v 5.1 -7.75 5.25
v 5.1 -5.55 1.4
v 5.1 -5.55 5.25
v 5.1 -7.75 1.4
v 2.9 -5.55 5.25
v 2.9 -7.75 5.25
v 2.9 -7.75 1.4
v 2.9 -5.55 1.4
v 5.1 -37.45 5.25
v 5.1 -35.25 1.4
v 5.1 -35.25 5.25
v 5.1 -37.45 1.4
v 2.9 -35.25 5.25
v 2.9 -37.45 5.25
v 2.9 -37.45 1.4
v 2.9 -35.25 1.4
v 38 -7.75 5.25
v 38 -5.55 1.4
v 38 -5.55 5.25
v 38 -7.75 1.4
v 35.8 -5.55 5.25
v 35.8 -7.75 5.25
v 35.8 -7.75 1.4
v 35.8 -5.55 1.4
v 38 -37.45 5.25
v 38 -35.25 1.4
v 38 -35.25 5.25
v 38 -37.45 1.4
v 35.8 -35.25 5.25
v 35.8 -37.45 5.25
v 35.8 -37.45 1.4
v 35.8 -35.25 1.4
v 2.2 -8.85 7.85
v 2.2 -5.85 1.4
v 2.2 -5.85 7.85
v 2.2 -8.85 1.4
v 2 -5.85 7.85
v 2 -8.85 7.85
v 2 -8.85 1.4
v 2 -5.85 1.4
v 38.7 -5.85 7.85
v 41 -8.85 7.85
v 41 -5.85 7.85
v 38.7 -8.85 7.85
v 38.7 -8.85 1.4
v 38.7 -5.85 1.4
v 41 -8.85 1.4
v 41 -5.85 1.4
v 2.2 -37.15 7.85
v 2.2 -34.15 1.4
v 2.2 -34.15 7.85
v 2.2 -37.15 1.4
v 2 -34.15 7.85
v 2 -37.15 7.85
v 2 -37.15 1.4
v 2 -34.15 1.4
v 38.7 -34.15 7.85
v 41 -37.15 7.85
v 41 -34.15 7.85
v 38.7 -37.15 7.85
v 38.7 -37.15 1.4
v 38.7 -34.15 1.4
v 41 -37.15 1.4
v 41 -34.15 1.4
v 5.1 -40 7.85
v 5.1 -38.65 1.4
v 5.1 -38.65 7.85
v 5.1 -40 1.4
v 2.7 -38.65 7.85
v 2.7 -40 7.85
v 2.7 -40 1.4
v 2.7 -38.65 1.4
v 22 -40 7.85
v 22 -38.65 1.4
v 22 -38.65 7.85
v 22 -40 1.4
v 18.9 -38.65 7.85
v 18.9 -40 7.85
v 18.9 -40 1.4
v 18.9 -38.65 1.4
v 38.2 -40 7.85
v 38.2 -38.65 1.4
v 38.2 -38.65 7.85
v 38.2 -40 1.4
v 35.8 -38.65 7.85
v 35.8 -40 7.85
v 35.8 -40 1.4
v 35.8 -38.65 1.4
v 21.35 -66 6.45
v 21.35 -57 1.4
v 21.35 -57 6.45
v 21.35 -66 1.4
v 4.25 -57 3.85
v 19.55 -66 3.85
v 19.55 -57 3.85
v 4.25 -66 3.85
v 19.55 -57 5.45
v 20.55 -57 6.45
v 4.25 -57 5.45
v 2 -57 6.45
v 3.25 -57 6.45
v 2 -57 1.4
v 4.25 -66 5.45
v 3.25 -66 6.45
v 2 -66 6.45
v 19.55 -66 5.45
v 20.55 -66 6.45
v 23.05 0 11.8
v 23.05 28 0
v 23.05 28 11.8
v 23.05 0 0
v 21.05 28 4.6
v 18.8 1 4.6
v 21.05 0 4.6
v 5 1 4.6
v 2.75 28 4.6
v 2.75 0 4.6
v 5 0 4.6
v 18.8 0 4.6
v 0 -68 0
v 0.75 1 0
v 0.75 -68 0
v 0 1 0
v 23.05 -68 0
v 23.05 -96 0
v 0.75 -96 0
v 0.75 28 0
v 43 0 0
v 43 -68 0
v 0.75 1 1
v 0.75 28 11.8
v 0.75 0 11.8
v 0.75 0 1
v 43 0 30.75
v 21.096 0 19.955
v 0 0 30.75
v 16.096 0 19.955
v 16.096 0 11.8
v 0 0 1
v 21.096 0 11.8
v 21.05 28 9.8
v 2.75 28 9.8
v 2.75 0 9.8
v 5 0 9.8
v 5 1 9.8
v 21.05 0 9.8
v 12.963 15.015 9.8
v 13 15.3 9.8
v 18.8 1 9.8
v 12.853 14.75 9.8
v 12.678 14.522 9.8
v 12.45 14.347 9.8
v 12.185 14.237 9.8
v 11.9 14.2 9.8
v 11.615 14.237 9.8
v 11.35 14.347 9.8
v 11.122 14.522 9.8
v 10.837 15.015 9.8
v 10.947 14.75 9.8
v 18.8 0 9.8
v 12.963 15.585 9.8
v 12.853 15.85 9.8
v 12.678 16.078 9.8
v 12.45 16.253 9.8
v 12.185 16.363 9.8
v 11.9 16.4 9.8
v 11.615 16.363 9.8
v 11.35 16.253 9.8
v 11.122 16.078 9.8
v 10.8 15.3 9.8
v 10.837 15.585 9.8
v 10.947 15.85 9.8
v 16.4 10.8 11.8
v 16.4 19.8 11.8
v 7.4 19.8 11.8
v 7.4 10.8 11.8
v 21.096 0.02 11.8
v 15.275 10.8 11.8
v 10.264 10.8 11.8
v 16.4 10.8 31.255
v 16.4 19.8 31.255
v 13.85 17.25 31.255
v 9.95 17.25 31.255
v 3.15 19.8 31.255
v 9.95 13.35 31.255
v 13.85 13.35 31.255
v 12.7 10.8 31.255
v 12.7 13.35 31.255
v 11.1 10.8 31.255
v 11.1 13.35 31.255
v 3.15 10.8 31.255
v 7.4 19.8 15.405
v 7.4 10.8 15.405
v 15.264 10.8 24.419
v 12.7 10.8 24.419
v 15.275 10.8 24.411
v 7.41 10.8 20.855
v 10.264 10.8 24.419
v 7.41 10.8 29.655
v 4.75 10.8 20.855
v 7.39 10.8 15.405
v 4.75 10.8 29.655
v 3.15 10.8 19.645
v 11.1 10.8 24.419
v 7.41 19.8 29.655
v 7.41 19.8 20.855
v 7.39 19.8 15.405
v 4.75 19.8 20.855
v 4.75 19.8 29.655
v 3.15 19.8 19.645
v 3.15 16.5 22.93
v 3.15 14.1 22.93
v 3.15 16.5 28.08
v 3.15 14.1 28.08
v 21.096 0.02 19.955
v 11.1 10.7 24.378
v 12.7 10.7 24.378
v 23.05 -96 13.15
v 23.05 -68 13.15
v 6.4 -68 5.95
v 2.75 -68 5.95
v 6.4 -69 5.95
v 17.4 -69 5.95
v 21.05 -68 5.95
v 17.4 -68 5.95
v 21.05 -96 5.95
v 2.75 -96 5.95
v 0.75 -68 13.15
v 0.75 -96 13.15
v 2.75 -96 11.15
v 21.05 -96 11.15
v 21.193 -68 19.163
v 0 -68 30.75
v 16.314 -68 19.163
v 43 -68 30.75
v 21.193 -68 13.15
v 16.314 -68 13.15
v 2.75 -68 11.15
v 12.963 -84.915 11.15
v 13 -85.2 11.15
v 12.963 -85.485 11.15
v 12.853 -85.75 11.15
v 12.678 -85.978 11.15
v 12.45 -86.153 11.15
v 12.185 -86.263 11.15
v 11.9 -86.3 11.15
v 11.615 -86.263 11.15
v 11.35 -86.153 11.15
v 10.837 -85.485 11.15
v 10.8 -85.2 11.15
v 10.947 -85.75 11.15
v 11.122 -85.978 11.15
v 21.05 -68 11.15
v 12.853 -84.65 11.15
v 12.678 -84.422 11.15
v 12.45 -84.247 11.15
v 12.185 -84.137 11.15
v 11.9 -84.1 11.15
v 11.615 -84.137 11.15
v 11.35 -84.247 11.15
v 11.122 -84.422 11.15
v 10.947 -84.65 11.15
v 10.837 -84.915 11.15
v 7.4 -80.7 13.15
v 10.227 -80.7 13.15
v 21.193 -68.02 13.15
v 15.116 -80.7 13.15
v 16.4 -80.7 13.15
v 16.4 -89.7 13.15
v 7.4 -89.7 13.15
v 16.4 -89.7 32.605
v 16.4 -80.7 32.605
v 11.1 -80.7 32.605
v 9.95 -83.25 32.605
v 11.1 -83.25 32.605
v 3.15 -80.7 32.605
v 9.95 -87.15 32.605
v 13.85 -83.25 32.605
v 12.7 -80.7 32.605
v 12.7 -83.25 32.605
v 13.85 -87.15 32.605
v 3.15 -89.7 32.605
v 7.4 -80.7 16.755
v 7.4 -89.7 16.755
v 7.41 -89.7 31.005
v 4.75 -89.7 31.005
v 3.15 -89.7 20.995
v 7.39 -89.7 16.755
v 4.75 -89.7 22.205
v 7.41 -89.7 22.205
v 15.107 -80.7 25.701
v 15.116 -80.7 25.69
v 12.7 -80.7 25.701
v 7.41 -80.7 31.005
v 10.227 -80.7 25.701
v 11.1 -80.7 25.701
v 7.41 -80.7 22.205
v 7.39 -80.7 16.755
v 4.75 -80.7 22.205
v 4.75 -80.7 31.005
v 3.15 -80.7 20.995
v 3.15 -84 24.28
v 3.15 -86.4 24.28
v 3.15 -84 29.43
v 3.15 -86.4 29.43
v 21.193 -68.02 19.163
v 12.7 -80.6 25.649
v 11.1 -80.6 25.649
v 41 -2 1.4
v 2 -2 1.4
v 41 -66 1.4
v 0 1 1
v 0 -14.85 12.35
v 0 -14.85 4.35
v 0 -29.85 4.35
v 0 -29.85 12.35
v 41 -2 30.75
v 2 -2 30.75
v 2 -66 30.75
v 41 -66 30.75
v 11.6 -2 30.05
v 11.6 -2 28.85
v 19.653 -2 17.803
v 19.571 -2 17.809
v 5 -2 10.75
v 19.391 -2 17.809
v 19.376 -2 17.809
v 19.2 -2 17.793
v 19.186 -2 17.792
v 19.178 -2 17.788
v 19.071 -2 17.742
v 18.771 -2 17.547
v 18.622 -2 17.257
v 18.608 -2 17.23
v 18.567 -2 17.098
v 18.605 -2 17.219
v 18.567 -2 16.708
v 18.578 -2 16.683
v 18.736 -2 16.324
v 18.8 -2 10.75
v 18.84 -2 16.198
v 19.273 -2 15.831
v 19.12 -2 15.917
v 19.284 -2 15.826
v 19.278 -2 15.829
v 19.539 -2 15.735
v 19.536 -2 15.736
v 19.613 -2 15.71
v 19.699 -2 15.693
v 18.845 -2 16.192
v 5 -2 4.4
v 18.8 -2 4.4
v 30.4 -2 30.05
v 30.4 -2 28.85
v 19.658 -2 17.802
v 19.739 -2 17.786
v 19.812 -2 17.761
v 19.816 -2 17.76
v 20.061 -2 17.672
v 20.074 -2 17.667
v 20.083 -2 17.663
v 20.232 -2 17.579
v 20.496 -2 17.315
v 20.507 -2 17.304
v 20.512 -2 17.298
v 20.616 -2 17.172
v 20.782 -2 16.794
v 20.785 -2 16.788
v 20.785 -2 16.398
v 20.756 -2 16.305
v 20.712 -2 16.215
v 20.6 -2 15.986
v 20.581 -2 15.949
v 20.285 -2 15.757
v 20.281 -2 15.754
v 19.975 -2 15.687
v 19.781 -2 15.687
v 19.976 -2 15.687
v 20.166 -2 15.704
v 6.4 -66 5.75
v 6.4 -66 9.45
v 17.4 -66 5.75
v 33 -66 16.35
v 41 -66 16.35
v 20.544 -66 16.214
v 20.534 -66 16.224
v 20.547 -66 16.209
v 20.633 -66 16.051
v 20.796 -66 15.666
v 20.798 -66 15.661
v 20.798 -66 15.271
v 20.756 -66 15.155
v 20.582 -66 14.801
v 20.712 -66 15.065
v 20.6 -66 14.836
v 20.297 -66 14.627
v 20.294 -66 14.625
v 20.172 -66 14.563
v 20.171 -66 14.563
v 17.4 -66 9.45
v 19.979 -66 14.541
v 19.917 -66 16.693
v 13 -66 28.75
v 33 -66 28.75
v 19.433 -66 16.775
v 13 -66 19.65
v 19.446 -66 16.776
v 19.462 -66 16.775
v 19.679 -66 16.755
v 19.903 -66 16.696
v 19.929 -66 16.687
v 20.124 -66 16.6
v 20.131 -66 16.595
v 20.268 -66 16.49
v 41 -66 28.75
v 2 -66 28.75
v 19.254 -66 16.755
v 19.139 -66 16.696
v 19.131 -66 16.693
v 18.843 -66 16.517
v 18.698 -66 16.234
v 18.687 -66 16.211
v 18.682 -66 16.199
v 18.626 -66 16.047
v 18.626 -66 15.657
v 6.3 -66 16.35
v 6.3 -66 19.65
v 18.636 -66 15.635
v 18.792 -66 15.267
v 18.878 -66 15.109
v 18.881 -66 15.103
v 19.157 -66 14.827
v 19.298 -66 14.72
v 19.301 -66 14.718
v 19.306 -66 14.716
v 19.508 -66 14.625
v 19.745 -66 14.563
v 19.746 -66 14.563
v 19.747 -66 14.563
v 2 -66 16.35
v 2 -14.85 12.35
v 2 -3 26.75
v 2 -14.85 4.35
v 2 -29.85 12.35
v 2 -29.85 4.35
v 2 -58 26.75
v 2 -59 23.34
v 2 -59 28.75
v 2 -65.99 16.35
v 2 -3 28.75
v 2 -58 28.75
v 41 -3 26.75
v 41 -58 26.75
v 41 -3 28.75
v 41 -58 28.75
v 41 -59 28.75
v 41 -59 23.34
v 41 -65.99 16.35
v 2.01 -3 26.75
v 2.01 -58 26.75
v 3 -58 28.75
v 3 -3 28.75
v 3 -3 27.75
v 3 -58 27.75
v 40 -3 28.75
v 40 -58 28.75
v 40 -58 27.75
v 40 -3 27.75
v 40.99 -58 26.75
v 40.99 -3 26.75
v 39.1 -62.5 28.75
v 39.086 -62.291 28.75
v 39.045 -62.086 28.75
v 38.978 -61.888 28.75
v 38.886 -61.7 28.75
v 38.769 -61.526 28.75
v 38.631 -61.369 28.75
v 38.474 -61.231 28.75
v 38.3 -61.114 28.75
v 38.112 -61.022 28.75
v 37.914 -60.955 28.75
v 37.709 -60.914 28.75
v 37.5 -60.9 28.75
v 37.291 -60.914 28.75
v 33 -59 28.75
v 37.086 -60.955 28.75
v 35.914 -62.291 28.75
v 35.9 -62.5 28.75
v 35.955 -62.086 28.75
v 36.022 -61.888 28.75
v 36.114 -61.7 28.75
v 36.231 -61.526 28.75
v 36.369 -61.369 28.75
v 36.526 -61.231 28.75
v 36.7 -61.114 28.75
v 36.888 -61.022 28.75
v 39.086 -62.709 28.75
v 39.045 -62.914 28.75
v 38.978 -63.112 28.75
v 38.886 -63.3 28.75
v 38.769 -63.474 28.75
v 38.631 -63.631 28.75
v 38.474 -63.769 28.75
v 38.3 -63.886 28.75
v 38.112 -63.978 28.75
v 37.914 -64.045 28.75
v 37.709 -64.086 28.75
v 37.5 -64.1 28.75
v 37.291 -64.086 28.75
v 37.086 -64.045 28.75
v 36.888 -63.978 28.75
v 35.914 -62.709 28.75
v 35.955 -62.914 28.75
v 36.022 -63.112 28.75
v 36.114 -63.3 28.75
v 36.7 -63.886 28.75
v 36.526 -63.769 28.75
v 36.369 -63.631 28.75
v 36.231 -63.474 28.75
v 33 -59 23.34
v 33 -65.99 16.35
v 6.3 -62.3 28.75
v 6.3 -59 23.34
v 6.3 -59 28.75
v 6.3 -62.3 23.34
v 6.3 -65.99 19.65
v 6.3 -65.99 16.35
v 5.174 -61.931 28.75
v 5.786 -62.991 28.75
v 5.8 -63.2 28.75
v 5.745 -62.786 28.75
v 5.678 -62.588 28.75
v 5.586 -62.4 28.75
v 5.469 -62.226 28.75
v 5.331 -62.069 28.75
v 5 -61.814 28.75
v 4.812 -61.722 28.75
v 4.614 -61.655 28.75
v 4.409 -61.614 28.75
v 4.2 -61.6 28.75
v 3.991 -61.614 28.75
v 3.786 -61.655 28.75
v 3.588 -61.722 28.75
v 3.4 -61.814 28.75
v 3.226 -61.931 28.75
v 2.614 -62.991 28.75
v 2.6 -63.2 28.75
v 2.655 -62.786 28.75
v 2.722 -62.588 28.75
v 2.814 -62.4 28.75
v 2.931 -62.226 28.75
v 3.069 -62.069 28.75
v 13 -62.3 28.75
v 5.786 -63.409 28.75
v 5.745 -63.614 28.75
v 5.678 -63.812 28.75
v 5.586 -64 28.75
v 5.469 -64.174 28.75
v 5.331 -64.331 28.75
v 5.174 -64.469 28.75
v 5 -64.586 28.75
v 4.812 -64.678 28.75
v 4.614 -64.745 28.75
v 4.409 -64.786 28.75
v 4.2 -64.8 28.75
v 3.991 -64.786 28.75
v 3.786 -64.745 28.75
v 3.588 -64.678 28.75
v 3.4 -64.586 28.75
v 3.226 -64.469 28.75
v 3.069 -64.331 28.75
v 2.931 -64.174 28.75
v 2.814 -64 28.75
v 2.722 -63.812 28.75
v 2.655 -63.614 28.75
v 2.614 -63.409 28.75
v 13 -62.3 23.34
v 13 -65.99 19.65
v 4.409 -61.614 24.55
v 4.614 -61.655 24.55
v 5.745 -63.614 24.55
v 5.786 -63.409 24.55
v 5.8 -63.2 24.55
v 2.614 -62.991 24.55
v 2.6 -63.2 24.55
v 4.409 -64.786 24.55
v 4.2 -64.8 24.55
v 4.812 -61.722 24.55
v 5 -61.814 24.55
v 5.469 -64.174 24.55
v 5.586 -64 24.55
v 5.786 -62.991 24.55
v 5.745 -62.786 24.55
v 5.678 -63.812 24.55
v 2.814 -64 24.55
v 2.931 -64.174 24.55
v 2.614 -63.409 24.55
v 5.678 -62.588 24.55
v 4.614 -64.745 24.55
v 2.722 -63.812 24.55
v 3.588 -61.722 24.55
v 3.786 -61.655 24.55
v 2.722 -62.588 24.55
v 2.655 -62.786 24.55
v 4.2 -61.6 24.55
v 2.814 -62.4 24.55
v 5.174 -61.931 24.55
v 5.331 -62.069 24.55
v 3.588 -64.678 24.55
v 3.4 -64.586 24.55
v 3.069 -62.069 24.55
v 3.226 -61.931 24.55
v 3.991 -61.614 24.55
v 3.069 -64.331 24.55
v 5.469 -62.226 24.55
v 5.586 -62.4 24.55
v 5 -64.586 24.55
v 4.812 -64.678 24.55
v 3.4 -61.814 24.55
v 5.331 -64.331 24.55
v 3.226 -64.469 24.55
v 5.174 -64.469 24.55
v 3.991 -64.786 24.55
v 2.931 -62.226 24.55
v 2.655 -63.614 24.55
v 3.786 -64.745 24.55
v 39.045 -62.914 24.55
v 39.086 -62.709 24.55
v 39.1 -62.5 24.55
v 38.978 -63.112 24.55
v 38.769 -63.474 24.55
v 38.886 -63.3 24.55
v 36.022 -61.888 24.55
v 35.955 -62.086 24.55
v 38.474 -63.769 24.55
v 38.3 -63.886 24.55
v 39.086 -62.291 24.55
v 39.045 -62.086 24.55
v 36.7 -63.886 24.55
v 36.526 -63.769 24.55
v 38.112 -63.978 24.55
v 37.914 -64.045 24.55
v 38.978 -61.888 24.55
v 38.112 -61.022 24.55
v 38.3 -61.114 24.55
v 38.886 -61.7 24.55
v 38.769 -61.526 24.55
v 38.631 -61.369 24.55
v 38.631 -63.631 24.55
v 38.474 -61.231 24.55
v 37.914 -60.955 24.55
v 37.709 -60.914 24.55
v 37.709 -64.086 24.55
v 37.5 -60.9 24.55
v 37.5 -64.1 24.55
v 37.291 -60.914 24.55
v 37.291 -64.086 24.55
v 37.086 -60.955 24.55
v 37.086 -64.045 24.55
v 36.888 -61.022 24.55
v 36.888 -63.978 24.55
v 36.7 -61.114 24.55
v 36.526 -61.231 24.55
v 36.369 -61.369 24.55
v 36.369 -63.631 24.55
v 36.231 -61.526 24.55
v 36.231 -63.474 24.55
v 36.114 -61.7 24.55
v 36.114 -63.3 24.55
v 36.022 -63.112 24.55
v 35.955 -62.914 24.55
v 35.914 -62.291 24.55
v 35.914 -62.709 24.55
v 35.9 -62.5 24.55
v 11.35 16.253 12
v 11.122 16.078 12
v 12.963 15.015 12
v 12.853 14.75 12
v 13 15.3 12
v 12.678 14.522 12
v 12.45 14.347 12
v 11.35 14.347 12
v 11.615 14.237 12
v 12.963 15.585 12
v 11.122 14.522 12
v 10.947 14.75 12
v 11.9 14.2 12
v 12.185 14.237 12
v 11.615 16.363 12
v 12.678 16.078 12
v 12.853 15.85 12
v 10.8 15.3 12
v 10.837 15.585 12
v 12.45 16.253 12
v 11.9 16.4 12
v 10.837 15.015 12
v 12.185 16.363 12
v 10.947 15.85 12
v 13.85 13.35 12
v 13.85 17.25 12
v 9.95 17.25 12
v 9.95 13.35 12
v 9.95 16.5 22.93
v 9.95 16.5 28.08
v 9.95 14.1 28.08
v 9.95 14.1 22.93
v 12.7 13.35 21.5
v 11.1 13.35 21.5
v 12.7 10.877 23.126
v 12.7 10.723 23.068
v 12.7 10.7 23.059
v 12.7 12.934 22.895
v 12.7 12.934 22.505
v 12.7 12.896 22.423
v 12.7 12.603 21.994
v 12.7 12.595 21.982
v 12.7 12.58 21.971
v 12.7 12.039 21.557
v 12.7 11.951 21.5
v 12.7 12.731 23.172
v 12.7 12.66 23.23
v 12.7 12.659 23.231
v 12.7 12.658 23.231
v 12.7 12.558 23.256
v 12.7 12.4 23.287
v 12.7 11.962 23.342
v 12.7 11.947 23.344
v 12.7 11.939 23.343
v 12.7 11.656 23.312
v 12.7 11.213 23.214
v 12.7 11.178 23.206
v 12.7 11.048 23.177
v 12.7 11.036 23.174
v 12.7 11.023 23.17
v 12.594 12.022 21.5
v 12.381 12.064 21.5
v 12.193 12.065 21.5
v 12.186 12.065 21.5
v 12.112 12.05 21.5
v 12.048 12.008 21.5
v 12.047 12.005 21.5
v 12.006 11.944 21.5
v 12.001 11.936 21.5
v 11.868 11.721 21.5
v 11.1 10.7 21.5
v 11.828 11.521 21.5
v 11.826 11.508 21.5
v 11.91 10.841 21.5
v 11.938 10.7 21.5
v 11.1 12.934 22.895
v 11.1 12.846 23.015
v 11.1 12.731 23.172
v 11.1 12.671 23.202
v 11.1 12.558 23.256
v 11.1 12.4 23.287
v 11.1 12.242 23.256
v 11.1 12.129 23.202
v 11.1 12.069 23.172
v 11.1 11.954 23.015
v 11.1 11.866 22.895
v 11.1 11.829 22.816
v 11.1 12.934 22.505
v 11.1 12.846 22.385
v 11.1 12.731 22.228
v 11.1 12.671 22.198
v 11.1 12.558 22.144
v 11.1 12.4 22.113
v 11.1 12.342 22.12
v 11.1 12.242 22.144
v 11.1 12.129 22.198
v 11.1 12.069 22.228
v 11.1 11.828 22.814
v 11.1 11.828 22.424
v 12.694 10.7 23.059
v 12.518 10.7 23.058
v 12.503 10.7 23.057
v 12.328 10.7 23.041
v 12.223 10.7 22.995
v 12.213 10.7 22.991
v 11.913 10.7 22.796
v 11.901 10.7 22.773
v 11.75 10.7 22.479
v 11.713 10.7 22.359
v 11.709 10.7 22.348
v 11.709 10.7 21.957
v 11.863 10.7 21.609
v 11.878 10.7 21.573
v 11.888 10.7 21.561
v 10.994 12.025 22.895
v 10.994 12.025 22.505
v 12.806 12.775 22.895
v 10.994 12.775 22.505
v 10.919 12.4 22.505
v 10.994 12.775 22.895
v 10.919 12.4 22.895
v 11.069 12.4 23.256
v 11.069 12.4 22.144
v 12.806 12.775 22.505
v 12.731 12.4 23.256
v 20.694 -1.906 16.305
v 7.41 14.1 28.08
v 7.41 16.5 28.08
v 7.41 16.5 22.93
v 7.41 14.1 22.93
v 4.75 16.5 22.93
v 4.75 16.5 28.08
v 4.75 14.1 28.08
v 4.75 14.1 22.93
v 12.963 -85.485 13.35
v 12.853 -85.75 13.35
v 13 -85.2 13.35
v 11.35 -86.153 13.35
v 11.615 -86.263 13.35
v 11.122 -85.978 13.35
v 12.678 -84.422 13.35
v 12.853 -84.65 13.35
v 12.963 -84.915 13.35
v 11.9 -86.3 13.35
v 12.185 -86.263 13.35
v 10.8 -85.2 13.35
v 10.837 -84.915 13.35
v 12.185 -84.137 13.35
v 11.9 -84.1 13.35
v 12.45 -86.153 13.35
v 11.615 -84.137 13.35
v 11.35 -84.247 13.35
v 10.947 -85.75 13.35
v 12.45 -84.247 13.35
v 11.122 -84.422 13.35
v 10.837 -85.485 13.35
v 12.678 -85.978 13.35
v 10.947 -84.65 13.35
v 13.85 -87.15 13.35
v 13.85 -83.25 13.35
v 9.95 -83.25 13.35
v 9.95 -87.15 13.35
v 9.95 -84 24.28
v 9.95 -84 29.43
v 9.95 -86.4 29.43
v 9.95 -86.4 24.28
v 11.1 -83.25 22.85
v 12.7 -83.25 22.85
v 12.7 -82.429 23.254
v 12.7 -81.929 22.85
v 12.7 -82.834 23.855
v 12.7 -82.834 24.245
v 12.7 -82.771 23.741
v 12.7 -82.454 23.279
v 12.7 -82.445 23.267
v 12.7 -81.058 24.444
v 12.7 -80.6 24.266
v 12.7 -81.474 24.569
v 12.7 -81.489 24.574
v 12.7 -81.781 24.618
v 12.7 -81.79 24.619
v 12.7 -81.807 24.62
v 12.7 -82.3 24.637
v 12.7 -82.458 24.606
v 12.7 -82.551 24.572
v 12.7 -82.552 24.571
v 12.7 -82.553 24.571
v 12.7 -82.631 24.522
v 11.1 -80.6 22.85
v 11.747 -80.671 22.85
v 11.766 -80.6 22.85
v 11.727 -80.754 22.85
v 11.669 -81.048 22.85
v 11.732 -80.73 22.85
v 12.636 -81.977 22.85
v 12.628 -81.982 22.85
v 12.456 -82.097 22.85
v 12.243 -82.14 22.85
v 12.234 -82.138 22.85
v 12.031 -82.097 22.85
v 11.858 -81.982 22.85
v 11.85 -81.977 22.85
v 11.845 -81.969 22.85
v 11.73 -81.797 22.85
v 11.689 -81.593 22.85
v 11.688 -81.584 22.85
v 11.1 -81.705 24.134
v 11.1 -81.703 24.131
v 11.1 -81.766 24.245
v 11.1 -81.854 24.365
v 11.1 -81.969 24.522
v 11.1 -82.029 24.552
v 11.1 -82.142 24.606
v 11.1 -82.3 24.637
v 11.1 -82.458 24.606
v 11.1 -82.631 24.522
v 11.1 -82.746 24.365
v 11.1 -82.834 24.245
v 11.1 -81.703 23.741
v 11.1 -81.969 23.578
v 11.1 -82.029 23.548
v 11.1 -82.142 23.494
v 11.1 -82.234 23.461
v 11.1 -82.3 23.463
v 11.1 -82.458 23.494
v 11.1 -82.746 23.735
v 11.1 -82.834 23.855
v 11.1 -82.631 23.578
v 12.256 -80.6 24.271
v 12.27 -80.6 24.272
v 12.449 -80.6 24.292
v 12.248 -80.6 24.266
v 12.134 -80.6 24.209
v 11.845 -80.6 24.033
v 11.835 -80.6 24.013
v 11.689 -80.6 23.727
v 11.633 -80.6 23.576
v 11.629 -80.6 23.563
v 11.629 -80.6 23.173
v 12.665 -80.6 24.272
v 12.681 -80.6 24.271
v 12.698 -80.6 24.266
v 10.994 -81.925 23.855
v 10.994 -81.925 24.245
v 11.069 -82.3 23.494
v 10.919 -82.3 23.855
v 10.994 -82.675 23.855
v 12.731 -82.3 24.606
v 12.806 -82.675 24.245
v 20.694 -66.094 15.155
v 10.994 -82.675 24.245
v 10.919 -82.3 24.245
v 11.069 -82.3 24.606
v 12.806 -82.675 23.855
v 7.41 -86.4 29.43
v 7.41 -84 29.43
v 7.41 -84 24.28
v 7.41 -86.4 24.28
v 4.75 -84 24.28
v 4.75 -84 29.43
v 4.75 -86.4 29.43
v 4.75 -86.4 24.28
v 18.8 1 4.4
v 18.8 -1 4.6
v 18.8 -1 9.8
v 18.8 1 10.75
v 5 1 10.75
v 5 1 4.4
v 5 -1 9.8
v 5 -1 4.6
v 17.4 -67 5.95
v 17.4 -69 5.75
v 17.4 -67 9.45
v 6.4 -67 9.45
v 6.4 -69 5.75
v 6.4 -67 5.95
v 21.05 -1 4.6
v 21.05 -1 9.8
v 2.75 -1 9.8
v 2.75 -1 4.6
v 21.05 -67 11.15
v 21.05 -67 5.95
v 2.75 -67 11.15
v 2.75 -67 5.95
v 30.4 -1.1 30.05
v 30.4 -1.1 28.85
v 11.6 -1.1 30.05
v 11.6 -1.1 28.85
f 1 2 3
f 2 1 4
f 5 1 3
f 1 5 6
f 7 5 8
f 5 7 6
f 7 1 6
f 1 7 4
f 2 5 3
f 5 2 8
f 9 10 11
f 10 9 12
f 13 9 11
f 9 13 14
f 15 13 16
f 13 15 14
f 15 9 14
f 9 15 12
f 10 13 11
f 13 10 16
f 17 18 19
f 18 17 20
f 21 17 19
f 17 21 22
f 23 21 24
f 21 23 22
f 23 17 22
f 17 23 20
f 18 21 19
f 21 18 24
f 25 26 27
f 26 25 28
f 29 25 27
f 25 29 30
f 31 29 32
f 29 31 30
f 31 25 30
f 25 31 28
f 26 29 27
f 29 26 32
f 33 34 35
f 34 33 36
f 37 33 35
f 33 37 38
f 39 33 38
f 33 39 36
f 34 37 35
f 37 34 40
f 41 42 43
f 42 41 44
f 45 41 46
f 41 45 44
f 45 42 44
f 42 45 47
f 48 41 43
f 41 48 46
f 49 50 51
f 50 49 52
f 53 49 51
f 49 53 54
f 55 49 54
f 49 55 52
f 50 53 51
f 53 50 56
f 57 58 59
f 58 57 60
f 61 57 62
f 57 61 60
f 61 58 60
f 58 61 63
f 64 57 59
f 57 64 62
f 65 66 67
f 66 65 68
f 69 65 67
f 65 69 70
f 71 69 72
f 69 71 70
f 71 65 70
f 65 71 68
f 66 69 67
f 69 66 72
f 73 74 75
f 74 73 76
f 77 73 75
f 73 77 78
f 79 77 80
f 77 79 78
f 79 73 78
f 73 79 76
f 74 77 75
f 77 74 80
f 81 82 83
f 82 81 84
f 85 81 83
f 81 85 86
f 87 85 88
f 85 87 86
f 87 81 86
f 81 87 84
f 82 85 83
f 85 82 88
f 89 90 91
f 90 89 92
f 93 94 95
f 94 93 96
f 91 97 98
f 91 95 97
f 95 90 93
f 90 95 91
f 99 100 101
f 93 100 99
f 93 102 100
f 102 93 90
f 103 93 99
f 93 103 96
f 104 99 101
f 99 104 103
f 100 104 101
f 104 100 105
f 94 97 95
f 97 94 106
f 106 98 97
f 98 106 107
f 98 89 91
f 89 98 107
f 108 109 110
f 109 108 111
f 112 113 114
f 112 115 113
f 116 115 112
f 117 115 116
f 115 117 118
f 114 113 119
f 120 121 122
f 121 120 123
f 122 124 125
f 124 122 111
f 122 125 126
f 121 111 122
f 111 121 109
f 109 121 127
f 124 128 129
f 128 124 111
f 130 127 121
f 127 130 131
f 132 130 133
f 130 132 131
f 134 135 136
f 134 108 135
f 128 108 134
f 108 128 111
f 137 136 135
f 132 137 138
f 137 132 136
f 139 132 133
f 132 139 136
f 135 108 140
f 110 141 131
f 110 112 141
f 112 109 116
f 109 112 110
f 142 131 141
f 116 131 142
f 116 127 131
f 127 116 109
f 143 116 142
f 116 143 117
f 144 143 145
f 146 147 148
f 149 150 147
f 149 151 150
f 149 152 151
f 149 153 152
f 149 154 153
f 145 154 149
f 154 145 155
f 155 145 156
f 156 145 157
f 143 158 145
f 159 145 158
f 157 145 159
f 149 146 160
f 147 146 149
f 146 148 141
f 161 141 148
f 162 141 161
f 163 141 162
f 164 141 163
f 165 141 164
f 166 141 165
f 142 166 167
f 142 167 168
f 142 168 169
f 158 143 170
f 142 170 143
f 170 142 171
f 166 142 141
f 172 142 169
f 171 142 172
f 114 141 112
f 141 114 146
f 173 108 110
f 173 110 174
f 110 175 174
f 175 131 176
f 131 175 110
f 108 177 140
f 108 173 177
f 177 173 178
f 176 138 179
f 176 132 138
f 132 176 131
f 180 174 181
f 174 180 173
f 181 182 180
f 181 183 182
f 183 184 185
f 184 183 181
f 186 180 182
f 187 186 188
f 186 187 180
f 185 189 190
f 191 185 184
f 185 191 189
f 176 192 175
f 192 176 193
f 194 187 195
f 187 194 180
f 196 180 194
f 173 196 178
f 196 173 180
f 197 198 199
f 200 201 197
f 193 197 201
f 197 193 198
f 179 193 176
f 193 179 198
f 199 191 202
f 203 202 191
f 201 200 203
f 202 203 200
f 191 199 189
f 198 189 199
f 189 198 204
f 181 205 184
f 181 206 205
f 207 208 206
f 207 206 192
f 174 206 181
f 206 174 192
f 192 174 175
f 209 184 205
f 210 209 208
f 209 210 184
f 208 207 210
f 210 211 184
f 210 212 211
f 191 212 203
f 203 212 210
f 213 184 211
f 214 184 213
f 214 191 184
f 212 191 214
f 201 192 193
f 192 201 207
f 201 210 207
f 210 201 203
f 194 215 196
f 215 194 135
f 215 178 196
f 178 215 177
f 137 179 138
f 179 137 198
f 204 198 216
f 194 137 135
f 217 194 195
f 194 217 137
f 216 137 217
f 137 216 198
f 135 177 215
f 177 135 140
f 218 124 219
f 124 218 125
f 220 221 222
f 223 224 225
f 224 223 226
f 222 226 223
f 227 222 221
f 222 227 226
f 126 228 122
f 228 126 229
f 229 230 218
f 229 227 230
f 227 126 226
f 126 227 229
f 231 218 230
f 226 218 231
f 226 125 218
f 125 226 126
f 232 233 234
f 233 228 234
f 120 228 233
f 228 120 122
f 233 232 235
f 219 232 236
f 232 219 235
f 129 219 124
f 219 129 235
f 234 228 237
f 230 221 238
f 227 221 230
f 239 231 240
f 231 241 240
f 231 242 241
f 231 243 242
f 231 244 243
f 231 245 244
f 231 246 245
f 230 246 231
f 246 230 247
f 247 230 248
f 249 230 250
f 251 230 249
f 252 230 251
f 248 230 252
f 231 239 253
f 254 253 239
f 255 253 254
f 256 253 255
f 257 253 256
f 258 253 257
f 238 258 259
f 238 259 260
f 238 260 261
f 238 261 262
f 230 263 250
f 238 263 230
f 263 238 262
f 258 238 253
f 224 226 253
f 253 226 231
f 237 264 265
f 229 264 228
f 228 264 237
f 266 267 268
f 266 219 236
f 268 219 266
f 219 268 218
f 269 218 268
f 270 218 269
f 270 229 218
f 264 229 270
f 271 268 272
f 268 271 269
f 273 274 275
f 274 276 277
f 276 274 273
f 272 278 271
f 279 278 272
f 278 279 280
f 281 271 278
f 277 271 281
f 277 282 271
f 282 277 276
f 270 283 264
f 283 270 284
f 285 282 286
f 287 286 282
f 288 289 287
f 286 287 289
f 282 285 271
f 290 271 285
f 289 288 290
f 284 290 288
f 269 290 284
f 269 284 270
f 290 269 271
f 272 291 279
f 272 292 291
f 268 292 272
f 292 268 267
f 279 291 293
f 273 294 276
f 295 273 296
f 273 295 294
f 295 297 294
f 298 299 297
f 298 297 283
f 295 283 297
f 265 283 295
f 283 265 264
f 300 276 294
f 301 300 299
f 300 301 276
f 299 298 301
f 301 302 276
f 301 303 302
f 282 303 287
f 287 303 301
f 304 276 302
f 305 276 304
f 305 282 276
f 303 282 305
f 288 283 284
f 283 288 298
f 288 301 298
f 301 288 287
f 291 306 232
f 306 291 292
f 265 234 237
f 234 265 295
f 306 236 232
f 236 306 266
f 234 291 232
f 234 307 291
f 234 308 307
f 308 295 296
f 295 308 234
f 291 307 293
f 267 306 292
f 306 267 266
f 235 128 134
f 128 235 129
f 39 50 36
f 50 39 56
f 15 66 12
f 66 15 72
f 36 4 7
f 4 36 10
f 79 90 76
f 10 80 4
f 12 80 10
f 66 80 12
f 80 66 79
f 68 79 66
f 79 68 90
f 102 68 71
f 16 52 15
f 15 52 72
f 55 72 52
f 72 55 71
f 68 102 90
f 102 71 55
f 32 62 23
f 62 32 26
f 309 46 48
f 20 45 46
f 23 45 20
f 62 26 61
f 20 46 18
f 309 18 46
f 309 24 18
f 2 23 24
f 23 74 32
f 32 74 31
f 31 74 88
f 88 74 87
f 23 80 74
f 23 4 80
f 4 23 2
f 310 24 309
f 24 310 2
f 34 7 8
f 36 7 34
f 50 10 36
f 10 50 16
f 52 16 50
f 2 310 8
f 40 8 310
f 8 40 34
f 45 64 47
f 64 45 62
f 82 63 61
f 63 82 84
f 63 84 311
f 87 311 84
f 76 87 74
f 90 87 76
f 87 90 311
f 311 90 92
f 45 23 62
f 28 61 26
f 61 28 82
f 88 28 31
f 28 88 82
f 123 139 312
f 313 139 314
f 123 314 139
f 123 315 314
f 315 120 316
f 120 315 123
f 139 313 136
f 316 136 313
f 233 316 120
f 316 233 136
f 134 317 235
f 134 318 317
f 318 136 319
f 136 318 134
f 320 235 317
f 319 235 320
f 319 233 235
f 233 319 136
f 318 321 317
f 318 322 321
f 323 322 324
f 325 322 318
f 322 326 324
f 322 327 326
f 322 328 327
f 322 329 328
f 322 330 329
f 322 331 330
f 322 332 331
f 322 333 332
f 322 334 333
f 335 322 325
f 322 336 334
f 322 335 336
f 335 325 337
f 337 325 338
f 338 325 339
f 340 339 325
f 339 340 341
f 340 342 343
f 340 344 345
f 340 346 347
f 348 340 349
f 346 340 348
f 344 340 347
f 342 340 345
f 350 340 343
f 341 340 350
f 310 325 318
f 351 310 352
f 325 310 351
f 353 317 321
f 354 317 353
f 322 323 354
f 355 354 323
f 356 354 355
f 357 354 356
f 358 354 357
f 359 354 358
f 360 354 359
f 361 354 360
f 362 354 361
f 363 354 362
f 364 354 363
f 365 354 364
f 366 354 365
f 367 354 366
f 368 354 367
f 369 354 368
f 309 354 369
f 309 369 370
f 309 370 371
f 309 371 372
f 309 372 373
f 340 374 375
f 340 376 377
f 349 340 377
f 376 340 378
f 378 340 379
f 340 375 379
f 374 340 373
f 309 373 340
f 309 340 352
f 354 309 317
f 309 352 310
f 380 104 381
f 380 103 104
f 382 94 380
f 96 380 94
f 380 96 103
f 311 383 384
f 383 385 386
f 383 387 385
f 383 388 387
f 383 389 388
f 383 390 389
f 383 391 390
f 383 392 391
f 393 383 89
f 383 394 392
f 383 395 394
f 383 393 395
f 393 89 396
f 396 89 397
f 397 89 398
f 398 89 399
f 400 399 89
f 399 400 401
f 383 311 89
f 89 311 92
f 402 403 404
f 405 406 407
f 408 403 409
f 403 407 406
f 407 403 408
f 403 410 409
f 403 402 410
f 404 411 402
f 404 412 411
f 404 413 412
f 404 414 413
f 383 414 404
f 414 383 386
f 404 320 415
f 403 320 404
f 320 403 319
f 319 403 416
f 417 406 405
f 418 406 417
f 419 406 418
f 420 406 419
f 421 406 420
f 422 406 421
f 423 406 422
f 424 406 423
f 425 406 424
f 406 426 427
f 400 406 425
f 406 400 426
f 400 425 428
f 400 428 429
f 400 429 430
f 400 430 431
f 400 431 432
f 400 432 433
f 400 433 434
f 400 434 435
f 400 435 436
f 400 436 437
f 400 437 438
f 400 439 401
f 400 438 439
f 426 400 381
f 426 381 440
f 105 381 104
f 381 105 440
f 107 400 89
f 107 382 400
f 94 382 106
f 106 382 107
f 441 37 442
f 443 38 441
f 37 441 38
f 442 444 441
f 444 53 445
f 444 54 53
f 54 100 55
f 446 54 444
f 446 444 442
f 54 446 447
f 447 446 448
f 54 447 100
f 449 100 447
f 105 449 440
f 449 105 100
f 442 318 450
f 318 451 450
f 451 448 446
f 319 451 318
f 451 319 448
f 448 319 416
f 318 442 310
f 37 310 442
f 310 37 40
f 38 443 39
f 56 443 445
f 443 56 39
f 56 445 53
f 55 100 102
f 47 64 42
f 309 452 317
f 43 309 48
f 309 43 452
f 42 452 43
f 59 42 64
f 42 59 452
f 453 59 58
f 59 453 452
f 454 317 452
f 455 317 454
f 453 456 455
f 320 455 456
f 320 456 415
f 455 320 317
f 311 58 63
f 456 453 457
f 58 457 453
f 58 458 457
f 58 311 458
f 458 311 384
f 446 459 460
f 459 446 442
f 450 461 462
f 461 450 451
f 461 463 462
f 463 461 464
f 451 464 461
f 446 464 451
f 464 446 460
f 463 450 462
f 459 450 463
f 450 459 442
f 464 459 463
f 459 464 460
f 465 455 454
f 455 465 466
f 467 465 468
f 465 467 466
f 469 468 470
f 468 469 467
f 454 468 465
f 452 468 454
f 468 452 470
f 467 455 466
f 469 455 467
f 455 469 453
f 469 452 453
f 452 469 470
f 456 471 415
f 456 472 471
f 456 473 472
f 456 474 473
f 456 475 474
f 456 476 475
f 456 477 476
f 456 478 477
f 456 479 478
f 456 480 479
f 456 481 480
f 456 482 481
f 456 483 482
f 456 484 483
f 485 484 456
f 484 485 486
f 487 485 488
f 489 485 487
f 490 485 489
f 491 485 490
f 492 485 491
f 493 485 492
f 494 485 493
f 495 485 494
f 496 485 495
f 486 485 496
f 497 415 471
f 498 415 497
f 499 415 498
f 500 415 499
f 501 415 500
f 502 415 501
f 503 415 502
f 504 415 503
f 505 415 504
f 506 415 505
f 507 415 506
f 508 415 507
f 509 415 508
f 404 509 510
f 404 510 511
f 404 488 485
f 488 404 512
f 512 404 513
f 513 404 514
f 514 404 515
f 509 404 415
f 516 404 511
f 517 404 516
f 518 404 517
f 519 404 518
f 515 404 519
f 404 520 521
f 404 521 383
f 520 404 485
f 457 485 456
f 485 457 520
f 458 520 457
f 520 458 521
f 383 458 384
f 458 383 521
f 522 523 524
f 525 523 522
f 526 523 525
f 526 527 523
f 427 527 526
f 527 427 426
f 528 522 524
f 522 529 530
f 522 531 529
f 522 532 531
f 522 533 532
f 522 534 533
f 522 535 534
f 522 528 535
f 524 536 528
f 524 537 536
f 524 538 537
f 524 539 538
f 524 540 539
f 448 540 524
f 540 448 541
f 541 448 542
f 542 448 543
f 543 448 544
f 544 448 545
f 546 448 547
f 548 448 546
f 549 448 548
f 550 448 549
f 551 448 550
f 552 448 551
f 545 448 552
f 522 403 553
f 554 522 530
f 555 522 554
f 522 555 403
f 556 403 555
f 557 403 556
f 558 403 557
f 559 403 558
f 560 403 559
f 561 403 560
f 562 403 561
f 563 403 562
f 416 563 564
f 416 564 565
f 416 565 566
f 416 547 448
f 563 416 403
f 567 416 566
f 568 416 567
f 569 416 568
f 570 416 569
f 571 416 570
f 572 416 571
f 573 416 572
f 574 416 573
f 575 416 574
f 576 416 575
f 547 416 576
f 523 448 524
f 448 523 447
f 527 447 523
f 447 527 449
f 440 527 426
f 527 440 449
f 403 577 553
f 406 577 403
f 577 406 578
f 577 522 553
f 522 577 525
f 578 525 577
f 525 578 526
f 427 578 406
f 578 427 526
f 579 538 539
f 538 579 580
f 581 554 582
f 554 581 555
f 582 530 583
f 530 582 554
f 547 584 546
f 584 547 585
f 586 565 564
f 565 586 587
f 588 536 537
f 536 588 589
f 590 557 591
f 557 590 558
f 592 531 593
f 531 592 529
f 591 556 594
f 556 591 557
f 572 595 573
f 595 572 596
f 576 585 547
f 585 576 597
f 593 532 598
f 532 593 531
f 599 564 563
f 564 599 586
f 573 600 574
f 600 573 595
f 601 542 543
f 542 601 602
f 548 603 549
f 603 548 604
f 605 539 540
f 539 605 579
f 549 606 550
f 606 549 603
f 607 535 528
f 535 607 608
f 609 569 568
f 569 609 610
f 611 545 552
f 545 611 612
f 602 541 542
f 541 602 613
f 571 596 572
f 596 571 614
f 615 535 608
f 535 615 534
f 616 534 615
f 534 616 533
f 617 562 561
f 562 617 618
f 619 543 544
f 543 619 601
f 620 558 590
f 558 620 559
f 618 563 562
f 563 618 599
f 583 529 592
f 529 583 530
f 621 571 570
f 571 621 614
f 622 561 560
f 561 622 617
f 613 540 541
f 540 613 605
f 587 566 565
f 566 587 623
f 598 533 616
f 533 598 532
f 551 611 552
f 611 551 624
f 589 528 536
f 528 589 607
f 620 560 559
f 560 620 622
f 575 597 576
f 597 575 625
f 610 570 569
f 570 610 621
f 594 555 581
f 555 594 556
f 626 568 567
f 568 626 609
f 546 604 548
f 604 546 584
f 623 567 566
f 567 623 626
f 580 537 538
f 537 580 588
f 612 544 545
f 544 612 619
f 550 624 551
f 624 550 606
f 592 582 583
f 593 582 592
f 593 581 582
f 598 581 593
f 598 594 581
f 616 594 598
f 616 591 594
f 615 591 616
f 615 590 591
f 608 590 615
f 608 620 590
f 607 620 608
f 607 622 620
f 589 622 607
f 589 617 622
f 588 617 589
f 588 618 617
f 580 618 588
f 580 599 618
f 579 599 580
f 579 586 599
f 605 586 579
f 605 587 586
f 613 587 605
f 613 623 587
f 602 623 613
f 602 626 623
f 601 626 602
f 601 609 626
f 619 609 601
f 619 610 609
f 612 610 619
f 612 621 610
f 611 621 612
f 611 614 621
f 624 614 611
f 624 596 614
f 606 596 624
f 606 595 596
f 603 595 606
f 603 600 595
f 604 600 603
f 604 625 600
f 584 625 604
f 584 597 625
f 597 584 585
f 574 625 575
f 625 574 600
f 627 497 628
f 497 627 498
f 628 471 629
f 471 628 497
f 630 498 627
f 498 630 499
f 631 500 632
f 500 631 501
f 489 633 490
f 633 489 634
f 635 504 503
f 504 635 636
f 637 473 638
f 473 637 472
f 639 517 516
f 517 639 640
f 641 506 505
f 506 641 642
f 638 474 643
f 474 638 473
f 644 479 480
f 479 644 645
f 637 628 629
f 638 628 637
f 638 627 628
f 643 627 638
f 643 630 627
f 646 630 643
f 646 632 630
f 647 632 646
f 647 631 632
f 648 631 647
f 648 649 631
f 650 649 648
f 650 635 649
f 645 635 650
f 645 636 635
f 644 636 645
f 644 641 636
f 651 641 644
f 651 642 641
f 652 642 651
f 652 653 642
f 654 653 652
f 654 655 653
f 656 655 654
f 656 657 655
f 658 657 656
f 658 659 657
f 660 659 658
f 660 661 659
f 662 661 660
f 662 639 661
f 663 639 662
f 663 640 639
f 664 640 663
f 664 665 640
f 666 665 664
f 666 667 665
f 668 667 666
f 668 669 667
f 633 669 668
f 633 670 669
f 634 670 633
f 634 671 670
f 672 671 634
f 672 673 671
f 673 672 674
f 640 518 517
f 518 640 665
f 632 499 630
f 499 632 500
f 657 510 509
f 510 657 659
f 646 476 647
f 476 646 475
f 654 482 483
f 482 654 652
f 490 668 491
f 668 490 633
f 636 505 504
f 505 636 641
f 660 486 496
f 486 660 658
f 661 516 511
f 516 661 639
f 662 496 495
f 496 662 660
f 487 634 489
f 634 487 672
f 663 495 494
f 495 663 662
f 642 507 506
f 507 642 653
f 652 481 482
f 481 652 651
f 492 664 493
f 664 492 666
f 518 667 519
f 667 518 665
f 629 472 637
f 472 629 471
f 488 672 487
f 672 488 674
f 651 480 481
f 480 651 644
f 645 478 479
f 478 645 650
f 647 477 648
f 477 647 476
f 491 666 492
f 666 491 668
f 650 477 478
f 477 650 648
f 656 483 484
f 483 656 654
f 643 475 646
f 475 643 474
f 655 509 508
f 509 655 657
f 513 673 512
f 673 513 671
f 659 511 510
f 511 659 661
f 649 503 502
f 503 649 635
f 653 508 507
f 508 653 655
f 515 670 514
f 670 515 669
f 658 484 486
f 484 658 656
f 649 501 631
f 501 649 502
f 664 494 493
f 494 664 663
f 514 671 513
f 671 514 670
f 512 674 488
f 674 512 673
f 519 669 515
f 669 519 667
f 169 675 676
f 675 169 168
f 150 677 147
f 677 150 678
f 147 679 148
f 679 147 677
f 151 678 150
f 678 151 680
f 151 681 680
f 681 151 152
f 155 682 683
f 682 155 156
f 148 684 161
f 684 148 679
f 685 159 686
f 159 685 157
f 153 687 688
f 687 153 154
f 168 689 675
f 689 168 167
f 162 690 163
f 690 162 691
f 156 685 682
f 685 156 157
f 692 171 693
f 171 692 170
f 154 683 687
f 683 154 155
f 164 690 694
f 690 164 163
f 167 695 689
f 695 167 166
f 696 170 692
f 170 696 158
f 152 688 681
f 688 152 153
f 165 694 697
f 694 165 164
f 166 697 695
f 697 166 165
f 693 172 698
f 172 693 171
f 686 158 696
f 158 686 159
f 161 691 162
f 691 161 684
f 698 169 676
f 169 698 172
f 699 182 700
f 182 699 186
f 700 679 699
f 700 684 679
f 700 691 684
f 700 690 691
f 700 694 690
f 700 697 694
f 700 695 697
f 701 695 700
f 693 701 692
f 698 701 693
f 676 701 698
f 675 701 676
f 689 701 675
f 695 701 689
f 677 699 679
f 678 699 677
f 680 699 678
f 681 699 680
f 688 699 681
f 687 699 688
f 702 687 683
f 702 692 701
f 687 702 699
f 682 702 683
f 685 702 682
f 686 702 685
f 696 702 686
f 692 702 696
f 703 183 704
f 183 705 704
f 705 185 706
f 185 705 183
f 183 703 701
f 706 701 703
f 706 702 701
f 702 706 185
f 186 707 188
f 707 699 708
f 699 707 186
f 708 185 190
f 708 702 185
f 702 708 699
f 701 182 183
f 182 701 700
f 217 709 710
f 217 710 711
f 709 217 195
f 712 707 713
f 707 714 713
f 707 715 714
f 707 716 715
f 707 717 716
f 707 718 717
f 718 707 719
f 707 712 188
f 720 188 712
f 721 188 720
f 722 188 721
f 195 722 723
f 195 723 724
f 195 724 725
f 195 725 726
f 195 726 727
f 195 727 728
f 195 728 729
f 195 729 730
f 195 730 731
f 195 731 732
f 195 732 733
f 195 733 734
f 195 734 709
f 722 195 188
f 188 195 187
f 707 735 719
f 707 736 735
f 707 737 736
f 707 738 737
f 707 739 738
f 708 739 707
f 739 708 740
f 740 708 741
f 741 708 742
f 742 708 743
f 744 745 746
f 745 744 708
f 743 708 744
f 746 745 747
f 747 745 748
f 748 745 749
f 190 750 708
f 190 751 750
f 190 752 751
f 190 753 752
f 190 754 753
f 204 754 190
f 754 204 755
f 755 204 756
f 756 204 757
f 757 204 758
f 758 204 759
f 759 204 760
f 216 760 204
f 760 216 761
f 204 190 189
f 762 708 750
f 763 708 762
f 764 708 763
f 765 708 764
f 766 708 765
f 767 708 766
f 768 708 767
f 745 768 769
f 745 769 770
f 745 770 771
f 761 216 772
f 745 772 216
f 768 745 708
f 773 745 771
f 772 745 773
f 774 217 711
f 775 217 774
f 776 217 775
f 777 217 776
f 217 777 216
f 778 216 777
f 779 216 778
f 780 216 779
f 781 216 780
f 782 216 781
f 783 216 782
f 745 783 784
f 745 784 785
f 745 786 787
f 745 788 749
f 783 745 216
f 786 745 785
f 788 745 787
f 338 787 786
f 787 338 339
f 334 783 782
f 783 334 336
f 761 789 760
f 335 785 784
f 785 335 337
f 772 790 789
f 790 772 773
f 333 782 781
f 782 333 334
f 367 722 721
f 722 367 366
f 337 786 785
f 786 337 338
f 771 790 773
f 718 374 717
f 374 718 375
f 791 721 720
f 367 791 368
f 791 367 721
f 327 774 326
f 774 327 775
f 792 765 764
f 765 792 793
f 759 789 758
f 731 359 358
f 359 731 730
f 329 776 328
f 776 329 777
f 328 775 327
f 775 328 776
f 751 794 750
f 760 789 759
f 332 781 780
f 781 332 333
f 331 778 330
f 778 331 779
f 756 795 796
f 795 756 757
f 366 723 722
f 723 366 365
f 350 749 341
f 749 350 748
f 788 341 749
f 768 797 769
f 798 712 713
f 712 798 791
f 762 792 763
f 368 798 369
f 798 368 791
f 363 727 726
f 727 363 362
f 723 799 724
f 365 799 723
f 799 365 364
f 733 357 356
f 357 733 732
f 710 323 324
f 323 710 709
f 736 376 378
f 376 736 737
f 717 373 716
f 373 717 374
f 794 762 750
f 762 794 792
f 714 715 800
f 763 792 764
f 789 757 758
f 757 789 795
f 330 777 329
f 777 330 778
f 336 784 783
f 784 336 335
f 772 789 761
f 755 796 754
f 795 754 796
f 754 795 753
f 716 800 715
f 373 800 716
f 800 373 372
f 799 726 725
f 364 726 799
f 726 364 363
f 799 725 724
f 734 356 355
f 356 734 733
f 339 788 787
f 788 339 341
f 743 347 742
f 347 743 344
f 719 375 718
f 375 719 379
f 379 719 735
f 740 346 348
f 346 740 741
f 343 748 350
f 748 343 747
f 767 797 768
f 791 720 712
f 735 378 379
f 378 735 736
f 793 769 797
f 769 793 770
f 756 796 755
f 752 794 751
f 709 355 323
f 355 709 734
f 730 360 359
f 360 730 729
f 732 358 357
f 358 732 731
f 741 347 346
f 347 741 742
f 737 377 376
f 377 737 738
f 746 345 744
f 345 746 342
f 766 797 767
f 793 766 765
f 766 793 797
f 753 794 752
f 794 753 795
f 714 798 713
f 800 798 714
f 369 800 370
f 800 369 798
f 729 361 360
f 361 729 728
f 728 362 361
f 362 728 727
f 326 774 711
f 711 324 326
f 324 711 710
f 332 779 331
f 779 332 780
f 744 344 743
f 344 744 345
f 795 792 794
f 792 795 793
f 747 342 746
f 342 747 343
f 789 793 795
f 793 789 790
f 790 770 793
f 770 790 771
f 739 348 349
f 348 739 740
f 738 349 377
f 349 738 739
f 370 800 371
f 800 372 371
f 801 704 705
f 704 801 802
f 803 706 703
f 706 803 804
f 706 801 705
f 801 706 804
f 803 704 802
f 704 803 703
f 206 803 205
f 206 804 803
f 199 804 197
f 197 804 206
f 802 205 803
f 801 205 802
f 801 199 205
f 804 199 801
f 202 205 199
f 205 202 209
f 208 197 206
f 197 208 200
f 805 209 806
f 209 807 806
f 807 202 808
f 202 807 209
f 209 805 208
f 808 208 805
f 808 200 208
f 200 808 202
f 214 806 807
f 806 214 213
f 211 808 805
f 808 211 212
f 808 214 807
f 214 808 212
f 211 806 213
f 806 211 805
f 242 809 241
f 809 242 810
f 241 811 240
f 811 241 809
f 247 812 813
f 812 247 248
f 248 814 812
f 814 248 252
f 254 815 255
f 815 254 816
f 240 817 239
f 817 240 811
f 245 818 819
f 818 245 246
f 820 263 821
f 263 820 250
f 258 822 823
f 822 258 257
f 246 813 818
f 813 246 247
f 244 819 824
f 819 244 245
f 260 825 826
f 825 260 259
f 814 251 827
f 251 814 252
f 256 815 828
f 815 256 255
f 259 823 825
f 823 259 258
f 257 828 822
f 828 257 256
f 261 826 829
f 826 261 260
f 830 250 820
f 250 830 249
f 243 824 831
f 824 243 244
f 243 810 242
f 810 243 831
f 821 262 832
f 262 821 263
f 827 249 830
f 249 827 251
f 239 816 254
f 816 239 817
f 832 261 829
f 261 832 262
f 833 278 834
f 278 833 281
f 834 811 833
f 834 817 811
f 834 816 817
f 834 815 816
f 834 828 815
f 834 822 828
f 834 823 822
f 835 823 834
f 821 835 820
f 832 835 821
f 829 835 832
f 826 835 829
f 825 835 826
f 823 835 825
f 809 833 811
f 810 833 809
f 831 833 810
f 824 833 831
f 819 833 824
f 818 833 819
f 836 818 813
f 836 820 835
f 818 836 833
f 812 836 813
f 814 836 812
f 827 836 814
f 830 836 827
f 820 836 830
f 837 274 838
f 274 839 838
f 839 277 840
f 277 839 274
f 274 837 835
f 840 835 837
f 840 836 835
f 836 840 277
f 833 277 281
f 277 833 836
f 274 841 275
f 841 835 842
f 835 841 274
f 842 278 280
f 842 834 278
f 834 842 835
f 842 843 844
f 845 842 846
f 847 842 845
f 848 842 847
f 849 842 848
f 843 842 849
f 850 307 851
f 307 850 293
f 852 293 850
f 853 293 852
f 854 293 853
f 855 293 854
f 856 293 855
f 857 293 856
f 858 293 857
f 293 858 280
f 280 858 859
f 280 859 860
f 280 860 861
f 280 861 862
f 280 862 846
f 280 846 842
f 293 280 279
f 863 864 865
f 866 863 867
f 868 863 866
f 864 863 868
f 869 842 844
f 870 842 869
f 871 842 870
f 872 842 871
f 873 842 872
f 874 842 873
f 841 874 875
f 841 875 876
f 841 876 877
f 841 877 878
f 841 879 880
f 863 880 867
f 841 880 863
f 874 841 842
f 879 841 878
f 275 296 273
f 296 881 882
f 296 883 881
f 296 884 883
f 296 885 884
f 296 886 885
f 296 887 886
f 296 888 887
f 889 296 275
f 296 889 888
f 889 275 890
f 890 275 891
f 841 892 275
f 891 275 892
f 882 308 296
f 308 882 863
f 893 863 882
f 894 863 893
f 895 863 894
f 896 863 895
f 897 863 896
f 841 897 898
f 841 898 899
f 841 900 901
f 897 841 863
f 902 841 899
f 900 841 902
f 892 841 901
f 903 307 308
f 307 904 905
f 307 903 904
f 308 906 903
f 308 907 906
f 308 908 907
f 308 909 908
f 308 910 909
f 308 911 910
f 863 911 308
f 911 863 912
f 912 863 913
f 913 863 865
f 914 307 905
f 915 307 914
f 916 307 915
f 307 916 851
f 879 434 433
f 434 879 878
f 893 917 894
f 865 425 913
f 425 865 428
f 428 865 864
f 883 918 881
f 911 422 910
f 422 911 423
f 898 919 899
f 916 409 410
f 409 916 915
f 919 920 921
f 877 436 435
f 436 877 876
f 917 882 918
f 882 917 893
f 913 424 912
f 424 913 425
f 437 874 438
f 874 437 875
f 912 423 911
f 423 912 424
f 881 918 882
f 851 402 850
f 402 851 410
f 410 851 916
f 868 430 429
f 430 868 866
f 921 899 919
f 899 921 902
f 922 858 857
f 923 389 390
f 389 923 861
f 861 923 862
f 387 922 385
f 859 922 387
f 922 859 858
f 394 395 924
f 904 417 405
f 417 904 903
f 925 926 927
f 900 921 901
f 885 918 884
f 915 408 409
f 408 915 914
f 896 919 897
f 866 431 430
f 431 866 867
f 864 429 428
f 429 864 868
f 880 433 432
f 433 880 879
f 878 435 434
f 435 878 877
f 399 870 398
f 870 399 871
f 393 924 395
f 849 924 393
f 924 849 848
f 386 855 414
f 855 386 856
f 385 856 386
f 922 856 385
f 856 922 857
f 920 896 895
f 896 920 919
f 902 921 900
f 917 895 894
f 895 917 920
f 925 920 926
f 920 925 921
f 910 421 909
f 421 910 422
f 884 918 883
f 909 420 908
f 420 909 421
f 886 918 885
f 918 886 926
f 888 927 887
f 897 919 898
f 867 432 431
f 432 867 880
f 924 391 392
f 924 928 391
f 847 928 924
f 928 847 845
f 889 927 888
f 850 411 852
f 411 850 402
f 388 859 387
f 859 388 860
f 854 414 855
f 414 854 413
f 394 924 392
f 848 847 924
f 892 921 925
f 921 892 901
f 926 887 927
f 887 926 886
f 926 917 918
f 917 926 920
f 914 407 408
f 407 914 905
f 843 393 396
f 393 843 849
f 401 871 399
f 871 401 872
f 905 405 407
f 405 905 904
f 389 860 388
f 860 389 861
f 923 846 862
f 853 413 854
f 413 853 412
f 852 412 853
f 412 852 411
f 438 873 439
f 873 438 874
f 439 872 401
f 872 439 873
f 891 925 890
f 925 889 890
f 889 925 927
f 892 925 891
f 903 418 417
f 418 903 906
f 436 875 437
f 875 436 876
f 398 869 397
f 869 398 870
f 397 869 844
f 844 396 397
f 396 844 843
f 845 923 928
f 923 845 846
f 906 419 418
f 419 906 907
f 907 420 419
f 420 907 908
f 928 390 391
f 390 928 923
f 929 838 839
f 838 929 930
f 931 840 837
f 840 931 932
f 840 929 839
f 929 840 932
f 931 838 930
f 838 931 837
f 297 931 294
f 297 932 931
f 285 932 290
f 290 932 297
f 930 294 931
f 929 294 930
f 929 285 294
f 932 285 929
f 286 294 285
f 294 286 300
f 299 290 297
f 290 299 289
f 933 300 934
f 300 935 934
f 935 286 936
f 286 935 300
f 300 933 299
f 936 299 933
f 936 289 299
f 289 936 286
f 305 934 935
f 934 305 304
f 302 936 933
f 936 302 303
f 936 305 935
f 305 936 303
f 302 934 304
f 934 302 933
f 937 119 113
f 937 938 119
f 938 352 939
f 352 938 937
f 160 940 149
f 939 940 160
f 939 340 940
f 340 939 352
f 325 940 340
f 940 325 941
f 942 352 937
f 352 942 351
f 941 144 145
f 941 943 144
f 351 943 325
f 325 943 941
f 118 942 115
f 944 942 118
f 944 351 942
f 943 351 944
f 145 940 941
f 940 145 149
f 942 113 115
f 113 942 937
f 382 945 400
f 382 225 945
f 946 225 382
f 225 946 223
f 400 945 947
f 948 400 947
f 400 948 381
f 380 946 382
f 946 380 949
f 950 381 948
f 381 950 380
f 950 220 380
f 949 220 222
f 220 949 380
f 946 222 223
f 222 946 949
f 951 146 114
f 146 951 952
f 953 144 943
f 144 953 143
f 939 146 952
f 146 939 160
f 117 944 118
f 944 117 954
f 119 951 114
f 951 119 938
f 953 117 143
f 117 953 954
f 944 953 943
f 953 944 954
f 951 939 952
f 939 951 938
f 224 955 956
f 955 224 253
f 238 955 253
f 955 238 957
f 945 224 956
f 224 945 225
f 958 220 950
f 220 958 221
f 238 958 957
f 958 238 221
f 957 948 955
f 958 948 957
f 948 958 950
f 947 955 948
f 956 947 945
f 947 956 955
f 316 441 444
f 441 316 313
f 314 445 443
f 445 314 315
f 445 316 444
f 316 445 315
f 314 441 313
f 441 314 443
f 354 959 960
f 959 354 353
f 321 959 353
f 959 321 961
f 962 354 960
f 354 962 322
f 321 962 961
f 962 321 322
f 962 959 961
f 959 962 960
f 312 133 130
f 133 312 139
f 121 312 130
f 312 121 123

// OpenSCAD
// 2D views of the fixture for drawings/make.sh: a top view and a cut along the key centre line,
// each as a separate layer (body, lid and deck, bought parts, pin lift), plus the numbers they show.
// Render with -D 'part="none"' -D 'view="..."'.
include <../fixture.scad>

view = "echo";

// ---------------------------------------------------------------- bought parts (sizes from calipers)
module hub()     { bx(hub_x0, hub_x1, hub_t0, hub_t1, hub_top - hub_t, hub_top); }
module sockets() { for (xc = [pin_x, far_x]) { bx(xc - 6.5, xc + 6.5, n_face, n_face + 11, hub_top - 2.1, hub_top + 3.6);
                                            bx(xc - 6.5, xc + 6.5, s_face - 11, s_face, hub_top - 2.1, hub_top + 3.6); }
                   bx(hub_x0, hub_x0 + 7.5, usbc_t - 4.5, usbc_t + 4.5, hub_top, hub_top + 3.3); }
module yk5_adapter() { ab = plug_bot - yk5_ad_drop;
                   bx(pin_x - yk5_ad[0] / 2, pin_x + yk5_ad[0] / 2, s_face, yk5_face, ab, ab + yk5_ad[1]); }
module uturn()   { bx(far_x - 7, far_x + 7, s_face, s_face + 12.1, plug_bot - uturn_below, uturn_top); }
module rp2040()  { x0 = hub_x1 - 18; t0 = s_face - 23.5; zt = mcu_bot + mcu_t;    // board 18 x 23.5, lined up with the hub's east edge
                   bx(x0, hub_x1, t0, s_face, mcu_bot, zt);
                   bx(far_x - 4.5, far_x + 4.5, s_face - 7.4, s_face, zt, zt + 3.2);                  // its USB-C socket
                   for (x = [x0 + 2.8, x0 + 12.0]) bx(x, x + 3.2, t0 + 5.2, t0 + 9.4, zt, zt + 2.0); }   // RESET and BOOT buttons
module usb_in()  { bx(-12, hub_x0, usbc_t - 6, usbc_t + 6, hub_top + 1.6 - 3, hub_top + 1.6 + 3); }
module yk4()     { k = tunnel_z0; bx(pin_x - 8.9, pin_x + 8.9, n_face - 3.1 - 33, n_face - 3.1, k + 0.01, k + 3.3);
                   bx(pin_x - 6, pin_x + 6, n_face - 3.1, n_face + 8.8, k + yk4_plug_gap, k + yk4_plug_gap + 2.3); }
module yk5()     { k = tunnel_z0 + yk5_dz; bx(pin_x - 8.9, pin_x + 8.9, yk5_face + 4.8, yk5_face + 37.8, k + 0.01, k + 3.3);
                   bx(pin_x - 5, pin_x + 5, yk5_face + 0.01, yk5_face + 4.8, k + 0.3, k + 3.0); }
module board(b)  { bx(b[0], b[0] + brd[0], b[1], b[1] + brd[1], deck_z1, deck_z1 + brd[2]); }   // in its drawer on the deck
module boards_n() { board(BOARDS[0]); board(BOARDS[1]); }
module boards_s() { board(BOARDS[2]); board(BOARDS[3]); }
module boards()  { boards_n(); boards_s(); }
module bought()  { hub(); sockets(); yk5_adapter(); uturn(); rp2040(); usb_in(); boards(); }
module keys()    { yk4(); yk5(); }
module pogo(d)   { translate([0, 0, d[7]]) {                    // barrel, plunger pressed onto the button
                     cy(pin_x, d[2], barrel_top - 10.4, barrel_top, 1.02, 16);
                     cy(pin_x, d[2], pad_z, barrel_top - 10.4, 0.74, 16); } }
module lift()    { for (d = DRAWERS) { lift_in_place(d); pogo(d); } }

// a cut along the key centre line (x = pin_x), seen from the east: (ty, z)
module cut() { projection(cut = true) rotate([0, 0, 90]) rotate([0, 90, 0]) translate([-pin_x, 0, 0]) out() children(); }
// the top view: (x, ty); and a cut through it at z, to show the walls, fences, cradle and rails
module top() { projection() out() children(); }
module top_cut(z) { projection(cut = true) translate([0, 0, -z]) out() children(); }

// a side view (not a cut) for the parts beyond the cut, drawn dashed
module side() { projection() rotate([0, 0, 90]) rotate([0, 90, 0]) translate([-pin_x, 0, 0]) out() children(); }

if (view == "top_body")    top() body();
if (view == "top_floor")   top_cut(6) body();
if (view == "top_hub")     top() { hub(); sockets(); }
if (view == "top_adapter") top() yk5_adapter();
if (view == "top_uturn")   top() uturn();
if (view == "top_rp2040")  top() rp2040();
if (view == "top_usbin")   top() usb_in();
if (view == "top_keys")    top() keys();
if (view == "top_lift")    top() lift();
if (view == "cut_body")    cut() body();
if (view == "cut_cover")   cut() { deck(); lid(); }
if (view == "cut_hub")     cut() { hub(); sockets(); }
if (view == "cut_adapter") cut() yk5_adapter();
if (view == "cut_keys")    cut() keys();
if (view == "cut_lift")    cut() lift();
if (view == "side_uturn")  side() uturn();
if (view == "side_rp2040") side() rp2040();

if (view == "echo") {
    echo(str("DIM ", "box_w=", box_w, " box_l=", box_l, " box_h=", box_h, " wall=", wall, " slack=", slack, " fit=", fit,
             " hub_x0=", hub_x0, " hub_x1=", hub_x1, " hub_t0=", hub_t0, " hub_t1=", hub_t1, " hub_top=", hub_top,
             " n_face=", n_face, " s_face=", s_face, " yk5_face=", yk5_face, " a_face=", a_face,
             " pin_x=", pin_x, " pin_ty_yk4=", pin_ty_yk4, " pin_ty_yk5=", pin_ty_yk5,
             " yk4_btn=", yk4_btn, " yk5_btn=", yk5_btn, " btn_d=", btn_d, " sock_out=", sock_out,
             " hub_ns=", hub_ns, " hub_we=", hub_we, " adapter_out=", adapter_out,
             " deck_z0=", deck_z0, " deck_z1=", deck_z1, " lid_z=", lid_z, " mcu_bot=", mcu_bot, " mcu_z=", mcu_z,
             " uturn_top=", uturn_top, " uturn_h=", uturn_h, " tower_top=", tower_top, " yk5_dz=", yk5_dz,
             " ad_bot=", plug_bot - yk5_ad_drop, " pin_lift=", pin_lift, " drawer_n=", DRAWERS[0][0],
             " drawer_s=", DRAWERS[1][1]));
    cube(1);
}
